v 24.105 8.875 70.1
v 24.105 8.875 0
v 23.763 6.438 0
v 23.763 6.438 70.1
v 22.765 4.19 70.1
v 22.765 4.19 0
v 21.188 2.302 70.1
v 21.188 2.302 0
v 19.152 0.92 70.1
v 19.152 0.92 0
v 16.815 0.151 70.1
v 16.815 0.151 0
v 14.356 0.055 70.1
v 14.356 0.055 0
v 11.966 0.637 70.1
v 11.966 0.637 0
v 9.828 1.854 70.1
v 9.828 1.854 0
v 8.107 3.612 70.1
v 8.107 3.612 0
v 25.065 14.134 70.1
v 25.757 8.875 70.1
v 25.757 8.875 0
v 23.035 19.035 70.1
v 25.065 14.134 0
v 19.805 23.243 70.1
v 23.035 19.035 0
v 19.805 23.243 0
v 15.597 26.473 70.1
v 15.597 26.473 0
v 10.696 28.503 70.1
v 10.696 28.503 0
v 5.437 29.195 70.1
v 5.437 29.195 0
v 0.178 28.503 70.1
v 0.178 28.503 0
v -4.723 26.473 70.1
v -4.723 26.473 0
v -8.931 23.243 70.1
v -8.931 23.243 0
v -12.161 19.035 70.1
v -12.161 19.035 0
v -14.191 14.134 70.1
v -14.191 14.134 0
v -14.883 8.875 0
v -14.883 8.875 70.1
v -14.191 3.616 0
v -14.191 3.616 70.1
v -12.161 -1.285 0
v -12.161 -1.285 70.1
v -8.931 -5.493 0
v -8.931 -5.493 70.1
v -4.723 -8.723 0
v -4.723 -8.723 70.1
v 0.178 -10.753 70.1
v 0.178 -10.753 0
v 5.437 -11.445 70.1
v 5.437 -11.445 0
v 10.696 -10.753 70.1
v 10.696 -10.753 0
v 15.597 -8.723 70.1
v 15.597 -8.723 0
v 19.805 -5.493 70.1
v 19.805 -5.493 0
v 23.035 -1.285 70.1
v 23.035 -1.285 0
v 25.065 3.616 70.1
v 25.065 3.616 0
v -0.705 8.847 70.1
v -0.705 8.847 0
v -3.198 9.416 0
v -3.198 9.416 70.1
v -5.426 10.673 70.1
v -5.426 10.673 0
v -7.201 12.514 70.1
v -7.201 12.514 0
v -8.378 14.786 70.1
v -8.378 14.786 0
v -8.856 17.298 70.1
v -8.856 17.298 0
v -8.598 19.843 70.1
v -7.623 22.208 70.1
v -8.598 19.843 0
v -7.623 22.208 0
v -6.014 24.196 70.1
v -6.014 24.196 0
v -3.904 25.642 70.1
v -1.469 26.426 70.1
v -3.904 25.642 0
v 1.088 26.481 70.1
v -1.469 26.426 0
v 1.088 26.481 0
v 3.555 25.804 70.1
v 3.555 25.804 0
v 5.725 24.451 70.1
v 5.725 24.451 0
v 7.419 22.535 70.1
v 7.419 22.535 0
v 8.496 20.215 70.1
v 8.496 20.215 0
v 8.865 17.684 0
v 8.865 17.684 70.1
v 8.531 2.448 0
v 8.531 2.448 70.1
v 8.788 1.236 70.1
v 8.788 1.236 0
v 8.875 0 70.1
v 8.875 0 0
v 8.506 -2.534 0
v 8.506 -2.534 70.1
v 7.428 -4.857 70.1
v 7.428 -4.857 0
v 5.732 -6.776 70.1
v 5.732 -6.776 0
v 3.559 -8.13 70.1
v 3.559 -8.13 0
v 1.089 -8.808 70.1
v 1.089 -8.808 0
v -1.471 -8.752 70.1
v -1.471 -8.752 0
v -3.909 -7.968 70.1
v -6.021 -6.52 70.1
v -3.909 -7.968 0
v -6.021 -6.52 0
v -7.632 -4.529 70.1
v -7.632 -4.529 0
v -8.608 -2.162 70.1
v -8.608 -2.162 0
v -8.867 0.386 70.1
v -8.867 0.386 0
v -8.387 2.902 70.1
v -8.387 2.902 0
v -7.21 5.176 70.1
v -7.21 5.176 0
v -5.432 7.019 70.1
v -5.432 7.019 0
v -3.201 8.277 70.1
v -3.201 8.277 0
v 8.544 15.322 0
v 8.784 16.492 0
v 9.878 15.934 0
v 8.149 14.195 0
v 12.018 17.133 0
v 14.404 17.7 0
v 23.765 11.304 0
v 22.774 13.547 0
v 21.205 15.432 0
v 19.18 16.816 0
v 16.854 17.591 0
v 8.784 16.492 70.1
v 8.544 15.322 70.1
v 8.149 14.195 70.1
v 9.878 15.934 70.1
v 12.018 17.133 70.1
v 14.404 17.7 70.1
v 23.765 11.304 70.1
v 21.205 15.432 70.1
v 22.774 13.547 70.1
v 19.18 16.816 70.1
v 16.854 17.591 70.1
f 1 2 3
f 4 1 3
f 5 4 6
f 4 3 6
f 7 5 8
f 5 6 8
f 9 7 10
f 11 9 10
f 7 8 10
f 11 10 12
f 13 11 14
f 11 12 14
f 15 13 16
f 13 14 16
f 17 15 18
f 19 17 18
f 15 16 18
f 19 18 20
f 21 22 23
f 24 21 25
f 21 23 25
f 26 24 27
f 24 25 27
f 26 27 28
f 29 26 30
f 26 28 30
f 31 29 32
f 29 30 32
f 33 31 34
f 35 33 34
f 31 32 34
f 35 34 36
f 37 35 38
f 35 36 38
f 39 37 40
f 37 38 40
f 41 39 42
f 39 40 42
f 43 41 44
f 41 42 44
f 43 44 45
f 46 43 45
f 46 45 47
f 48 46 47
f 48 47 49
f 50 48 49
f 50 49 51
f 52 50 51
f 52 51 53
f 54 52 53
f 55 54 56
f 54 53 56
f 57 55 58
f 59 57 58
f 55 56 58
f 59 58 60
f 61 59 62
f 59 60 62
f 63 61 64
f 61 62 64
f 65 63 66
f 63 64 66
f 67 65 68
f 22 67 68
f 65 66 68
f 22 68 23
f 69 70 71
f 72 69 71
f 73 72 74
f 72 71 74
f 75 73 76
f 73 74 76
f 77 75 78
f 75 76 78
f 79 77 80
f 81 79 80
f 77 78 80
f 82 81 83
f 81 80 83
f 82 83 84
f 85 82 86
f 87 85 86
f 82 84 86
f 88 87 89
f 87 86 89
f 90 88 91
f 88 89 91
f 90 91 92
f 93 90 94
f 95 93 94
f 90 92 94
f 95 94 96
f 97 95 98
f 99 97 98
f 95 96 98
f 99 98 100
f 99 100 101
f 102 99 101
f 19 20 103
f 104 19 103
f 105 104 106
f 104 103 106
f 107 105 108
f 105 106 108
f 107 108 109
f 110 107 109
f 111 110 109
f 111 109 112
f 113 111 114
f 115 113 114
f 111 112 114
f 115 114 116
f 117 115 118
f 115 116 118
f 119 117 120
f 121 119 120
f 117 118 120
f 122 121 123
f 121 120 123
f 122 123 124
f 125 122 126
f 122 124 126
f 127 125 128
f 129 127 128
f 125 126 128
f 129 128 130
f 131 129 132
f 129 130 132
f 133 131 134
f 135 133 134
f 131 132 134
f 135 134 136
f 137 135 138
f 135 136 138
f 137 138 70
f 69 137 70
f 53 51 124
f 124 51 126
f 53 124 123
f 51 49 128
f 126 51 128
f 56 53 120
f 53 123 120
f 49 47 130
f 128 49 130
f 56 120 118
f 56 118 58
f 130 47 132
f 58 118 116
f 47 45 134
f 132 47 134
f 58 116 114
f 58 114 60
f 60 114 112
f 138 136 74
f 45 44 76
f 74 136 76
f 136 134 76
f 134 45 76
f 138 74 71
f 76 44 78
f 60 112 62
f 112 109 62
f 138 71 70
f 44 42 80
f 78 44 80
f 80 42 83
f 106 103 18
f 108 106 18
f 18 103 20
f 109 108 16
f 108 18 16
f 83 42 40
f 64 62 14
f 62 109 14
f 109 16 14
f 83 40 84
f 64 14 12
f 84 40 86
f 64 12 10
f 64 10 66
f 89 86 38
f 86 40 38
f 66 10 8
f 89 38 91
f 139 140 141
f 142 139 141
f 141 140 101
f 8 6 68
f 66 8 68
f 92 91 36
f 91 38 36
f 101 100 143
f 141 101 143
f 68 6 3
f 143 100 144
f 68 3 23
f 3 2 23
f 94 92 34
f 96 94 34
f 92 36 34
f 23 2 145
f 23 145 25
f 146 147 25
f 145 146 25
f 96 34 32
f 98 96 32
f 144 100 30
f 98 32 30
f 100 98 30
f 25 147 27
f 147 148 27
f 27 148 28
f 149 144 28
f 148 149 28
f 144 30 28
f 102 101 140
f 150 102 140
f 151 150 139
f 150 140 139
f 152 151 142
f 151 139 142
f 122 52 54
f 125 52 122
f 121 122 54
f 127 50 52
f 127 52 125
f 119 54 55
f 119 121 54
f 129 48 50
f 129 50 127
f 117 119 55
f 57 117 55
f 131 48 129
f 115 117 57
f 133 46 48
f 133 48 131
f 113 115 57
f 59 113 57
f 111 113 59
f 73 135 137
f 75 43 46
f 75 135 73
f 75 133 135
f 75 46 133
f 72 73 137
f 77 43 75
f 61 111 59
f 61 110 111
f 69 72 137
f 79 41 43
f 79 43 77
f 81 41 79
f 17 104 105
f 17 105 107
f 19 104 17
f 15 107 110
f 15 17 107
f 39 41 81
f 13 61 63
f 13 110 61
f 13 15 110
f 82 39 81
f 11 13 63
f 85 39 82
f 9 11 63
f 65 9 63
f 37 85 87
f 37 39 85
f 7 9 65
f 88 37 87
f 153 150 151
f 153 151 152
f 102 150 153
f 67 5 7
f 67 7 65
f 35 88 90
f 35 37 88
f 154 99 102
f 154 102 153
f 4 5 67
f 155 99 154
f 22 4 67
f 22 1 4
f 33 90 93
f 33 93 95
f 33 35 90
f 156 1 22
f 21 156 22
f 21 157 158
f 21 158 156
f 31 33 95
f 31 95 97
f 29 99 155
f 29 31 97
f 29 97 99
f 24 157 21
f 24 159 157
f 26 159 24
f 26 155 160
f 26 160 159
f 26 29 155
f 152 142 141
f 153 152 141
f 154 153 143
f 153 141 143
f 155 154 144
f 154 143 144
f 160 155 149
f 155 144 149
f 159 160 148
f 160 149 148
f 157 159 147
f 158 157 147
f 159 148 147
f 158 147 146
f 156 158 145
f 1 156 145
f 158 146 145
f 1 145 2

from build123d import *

# Parameters (mm, degrees)
SKETCH1_R           = 20.32
BOSS_EXTRUDE2_DEPTH = 70.1


with BuildPart() as part:
    # Sketch1 → Boss-Extrude2 (new body)
    with BuildSketch(Plane.XY):
        with Locations((5.436965925, 8.875)):
            Circle(SKETCH1_R)
        with BuildLine():
            ThreePointArc((8.106562975, 3.61237619), (8.680765272, 1.846602096), (8.875, 0))
            ThreePointArc((8.875, 0), (-6.021266525, -6.519967365), (-0.704712549, 8.84697718))
            ThreePointArc((-0.704712549, 8.84697718), (-6.013906314, 24.19612946), (8.8646, 17.683521379))
            ThreePointArc((8.8646, 17.683521379), (8.683960375, 15.903081724), (8.149403519, 14.195204385))
            ThreePointArc((8.149403519, 14.195204385), (18.04408912, 17.284412427), (24.1046, 8.875))
            ThreePointArc((24.1046, 8.875), (18.010024125, 0.454305284), (8.106562975, 3.61237619))
        make_face(mode=Mode.SUBTRACT)
    extrude(amount=BOSS_EXTRUDE2_DEPTH)


solid = part.part
